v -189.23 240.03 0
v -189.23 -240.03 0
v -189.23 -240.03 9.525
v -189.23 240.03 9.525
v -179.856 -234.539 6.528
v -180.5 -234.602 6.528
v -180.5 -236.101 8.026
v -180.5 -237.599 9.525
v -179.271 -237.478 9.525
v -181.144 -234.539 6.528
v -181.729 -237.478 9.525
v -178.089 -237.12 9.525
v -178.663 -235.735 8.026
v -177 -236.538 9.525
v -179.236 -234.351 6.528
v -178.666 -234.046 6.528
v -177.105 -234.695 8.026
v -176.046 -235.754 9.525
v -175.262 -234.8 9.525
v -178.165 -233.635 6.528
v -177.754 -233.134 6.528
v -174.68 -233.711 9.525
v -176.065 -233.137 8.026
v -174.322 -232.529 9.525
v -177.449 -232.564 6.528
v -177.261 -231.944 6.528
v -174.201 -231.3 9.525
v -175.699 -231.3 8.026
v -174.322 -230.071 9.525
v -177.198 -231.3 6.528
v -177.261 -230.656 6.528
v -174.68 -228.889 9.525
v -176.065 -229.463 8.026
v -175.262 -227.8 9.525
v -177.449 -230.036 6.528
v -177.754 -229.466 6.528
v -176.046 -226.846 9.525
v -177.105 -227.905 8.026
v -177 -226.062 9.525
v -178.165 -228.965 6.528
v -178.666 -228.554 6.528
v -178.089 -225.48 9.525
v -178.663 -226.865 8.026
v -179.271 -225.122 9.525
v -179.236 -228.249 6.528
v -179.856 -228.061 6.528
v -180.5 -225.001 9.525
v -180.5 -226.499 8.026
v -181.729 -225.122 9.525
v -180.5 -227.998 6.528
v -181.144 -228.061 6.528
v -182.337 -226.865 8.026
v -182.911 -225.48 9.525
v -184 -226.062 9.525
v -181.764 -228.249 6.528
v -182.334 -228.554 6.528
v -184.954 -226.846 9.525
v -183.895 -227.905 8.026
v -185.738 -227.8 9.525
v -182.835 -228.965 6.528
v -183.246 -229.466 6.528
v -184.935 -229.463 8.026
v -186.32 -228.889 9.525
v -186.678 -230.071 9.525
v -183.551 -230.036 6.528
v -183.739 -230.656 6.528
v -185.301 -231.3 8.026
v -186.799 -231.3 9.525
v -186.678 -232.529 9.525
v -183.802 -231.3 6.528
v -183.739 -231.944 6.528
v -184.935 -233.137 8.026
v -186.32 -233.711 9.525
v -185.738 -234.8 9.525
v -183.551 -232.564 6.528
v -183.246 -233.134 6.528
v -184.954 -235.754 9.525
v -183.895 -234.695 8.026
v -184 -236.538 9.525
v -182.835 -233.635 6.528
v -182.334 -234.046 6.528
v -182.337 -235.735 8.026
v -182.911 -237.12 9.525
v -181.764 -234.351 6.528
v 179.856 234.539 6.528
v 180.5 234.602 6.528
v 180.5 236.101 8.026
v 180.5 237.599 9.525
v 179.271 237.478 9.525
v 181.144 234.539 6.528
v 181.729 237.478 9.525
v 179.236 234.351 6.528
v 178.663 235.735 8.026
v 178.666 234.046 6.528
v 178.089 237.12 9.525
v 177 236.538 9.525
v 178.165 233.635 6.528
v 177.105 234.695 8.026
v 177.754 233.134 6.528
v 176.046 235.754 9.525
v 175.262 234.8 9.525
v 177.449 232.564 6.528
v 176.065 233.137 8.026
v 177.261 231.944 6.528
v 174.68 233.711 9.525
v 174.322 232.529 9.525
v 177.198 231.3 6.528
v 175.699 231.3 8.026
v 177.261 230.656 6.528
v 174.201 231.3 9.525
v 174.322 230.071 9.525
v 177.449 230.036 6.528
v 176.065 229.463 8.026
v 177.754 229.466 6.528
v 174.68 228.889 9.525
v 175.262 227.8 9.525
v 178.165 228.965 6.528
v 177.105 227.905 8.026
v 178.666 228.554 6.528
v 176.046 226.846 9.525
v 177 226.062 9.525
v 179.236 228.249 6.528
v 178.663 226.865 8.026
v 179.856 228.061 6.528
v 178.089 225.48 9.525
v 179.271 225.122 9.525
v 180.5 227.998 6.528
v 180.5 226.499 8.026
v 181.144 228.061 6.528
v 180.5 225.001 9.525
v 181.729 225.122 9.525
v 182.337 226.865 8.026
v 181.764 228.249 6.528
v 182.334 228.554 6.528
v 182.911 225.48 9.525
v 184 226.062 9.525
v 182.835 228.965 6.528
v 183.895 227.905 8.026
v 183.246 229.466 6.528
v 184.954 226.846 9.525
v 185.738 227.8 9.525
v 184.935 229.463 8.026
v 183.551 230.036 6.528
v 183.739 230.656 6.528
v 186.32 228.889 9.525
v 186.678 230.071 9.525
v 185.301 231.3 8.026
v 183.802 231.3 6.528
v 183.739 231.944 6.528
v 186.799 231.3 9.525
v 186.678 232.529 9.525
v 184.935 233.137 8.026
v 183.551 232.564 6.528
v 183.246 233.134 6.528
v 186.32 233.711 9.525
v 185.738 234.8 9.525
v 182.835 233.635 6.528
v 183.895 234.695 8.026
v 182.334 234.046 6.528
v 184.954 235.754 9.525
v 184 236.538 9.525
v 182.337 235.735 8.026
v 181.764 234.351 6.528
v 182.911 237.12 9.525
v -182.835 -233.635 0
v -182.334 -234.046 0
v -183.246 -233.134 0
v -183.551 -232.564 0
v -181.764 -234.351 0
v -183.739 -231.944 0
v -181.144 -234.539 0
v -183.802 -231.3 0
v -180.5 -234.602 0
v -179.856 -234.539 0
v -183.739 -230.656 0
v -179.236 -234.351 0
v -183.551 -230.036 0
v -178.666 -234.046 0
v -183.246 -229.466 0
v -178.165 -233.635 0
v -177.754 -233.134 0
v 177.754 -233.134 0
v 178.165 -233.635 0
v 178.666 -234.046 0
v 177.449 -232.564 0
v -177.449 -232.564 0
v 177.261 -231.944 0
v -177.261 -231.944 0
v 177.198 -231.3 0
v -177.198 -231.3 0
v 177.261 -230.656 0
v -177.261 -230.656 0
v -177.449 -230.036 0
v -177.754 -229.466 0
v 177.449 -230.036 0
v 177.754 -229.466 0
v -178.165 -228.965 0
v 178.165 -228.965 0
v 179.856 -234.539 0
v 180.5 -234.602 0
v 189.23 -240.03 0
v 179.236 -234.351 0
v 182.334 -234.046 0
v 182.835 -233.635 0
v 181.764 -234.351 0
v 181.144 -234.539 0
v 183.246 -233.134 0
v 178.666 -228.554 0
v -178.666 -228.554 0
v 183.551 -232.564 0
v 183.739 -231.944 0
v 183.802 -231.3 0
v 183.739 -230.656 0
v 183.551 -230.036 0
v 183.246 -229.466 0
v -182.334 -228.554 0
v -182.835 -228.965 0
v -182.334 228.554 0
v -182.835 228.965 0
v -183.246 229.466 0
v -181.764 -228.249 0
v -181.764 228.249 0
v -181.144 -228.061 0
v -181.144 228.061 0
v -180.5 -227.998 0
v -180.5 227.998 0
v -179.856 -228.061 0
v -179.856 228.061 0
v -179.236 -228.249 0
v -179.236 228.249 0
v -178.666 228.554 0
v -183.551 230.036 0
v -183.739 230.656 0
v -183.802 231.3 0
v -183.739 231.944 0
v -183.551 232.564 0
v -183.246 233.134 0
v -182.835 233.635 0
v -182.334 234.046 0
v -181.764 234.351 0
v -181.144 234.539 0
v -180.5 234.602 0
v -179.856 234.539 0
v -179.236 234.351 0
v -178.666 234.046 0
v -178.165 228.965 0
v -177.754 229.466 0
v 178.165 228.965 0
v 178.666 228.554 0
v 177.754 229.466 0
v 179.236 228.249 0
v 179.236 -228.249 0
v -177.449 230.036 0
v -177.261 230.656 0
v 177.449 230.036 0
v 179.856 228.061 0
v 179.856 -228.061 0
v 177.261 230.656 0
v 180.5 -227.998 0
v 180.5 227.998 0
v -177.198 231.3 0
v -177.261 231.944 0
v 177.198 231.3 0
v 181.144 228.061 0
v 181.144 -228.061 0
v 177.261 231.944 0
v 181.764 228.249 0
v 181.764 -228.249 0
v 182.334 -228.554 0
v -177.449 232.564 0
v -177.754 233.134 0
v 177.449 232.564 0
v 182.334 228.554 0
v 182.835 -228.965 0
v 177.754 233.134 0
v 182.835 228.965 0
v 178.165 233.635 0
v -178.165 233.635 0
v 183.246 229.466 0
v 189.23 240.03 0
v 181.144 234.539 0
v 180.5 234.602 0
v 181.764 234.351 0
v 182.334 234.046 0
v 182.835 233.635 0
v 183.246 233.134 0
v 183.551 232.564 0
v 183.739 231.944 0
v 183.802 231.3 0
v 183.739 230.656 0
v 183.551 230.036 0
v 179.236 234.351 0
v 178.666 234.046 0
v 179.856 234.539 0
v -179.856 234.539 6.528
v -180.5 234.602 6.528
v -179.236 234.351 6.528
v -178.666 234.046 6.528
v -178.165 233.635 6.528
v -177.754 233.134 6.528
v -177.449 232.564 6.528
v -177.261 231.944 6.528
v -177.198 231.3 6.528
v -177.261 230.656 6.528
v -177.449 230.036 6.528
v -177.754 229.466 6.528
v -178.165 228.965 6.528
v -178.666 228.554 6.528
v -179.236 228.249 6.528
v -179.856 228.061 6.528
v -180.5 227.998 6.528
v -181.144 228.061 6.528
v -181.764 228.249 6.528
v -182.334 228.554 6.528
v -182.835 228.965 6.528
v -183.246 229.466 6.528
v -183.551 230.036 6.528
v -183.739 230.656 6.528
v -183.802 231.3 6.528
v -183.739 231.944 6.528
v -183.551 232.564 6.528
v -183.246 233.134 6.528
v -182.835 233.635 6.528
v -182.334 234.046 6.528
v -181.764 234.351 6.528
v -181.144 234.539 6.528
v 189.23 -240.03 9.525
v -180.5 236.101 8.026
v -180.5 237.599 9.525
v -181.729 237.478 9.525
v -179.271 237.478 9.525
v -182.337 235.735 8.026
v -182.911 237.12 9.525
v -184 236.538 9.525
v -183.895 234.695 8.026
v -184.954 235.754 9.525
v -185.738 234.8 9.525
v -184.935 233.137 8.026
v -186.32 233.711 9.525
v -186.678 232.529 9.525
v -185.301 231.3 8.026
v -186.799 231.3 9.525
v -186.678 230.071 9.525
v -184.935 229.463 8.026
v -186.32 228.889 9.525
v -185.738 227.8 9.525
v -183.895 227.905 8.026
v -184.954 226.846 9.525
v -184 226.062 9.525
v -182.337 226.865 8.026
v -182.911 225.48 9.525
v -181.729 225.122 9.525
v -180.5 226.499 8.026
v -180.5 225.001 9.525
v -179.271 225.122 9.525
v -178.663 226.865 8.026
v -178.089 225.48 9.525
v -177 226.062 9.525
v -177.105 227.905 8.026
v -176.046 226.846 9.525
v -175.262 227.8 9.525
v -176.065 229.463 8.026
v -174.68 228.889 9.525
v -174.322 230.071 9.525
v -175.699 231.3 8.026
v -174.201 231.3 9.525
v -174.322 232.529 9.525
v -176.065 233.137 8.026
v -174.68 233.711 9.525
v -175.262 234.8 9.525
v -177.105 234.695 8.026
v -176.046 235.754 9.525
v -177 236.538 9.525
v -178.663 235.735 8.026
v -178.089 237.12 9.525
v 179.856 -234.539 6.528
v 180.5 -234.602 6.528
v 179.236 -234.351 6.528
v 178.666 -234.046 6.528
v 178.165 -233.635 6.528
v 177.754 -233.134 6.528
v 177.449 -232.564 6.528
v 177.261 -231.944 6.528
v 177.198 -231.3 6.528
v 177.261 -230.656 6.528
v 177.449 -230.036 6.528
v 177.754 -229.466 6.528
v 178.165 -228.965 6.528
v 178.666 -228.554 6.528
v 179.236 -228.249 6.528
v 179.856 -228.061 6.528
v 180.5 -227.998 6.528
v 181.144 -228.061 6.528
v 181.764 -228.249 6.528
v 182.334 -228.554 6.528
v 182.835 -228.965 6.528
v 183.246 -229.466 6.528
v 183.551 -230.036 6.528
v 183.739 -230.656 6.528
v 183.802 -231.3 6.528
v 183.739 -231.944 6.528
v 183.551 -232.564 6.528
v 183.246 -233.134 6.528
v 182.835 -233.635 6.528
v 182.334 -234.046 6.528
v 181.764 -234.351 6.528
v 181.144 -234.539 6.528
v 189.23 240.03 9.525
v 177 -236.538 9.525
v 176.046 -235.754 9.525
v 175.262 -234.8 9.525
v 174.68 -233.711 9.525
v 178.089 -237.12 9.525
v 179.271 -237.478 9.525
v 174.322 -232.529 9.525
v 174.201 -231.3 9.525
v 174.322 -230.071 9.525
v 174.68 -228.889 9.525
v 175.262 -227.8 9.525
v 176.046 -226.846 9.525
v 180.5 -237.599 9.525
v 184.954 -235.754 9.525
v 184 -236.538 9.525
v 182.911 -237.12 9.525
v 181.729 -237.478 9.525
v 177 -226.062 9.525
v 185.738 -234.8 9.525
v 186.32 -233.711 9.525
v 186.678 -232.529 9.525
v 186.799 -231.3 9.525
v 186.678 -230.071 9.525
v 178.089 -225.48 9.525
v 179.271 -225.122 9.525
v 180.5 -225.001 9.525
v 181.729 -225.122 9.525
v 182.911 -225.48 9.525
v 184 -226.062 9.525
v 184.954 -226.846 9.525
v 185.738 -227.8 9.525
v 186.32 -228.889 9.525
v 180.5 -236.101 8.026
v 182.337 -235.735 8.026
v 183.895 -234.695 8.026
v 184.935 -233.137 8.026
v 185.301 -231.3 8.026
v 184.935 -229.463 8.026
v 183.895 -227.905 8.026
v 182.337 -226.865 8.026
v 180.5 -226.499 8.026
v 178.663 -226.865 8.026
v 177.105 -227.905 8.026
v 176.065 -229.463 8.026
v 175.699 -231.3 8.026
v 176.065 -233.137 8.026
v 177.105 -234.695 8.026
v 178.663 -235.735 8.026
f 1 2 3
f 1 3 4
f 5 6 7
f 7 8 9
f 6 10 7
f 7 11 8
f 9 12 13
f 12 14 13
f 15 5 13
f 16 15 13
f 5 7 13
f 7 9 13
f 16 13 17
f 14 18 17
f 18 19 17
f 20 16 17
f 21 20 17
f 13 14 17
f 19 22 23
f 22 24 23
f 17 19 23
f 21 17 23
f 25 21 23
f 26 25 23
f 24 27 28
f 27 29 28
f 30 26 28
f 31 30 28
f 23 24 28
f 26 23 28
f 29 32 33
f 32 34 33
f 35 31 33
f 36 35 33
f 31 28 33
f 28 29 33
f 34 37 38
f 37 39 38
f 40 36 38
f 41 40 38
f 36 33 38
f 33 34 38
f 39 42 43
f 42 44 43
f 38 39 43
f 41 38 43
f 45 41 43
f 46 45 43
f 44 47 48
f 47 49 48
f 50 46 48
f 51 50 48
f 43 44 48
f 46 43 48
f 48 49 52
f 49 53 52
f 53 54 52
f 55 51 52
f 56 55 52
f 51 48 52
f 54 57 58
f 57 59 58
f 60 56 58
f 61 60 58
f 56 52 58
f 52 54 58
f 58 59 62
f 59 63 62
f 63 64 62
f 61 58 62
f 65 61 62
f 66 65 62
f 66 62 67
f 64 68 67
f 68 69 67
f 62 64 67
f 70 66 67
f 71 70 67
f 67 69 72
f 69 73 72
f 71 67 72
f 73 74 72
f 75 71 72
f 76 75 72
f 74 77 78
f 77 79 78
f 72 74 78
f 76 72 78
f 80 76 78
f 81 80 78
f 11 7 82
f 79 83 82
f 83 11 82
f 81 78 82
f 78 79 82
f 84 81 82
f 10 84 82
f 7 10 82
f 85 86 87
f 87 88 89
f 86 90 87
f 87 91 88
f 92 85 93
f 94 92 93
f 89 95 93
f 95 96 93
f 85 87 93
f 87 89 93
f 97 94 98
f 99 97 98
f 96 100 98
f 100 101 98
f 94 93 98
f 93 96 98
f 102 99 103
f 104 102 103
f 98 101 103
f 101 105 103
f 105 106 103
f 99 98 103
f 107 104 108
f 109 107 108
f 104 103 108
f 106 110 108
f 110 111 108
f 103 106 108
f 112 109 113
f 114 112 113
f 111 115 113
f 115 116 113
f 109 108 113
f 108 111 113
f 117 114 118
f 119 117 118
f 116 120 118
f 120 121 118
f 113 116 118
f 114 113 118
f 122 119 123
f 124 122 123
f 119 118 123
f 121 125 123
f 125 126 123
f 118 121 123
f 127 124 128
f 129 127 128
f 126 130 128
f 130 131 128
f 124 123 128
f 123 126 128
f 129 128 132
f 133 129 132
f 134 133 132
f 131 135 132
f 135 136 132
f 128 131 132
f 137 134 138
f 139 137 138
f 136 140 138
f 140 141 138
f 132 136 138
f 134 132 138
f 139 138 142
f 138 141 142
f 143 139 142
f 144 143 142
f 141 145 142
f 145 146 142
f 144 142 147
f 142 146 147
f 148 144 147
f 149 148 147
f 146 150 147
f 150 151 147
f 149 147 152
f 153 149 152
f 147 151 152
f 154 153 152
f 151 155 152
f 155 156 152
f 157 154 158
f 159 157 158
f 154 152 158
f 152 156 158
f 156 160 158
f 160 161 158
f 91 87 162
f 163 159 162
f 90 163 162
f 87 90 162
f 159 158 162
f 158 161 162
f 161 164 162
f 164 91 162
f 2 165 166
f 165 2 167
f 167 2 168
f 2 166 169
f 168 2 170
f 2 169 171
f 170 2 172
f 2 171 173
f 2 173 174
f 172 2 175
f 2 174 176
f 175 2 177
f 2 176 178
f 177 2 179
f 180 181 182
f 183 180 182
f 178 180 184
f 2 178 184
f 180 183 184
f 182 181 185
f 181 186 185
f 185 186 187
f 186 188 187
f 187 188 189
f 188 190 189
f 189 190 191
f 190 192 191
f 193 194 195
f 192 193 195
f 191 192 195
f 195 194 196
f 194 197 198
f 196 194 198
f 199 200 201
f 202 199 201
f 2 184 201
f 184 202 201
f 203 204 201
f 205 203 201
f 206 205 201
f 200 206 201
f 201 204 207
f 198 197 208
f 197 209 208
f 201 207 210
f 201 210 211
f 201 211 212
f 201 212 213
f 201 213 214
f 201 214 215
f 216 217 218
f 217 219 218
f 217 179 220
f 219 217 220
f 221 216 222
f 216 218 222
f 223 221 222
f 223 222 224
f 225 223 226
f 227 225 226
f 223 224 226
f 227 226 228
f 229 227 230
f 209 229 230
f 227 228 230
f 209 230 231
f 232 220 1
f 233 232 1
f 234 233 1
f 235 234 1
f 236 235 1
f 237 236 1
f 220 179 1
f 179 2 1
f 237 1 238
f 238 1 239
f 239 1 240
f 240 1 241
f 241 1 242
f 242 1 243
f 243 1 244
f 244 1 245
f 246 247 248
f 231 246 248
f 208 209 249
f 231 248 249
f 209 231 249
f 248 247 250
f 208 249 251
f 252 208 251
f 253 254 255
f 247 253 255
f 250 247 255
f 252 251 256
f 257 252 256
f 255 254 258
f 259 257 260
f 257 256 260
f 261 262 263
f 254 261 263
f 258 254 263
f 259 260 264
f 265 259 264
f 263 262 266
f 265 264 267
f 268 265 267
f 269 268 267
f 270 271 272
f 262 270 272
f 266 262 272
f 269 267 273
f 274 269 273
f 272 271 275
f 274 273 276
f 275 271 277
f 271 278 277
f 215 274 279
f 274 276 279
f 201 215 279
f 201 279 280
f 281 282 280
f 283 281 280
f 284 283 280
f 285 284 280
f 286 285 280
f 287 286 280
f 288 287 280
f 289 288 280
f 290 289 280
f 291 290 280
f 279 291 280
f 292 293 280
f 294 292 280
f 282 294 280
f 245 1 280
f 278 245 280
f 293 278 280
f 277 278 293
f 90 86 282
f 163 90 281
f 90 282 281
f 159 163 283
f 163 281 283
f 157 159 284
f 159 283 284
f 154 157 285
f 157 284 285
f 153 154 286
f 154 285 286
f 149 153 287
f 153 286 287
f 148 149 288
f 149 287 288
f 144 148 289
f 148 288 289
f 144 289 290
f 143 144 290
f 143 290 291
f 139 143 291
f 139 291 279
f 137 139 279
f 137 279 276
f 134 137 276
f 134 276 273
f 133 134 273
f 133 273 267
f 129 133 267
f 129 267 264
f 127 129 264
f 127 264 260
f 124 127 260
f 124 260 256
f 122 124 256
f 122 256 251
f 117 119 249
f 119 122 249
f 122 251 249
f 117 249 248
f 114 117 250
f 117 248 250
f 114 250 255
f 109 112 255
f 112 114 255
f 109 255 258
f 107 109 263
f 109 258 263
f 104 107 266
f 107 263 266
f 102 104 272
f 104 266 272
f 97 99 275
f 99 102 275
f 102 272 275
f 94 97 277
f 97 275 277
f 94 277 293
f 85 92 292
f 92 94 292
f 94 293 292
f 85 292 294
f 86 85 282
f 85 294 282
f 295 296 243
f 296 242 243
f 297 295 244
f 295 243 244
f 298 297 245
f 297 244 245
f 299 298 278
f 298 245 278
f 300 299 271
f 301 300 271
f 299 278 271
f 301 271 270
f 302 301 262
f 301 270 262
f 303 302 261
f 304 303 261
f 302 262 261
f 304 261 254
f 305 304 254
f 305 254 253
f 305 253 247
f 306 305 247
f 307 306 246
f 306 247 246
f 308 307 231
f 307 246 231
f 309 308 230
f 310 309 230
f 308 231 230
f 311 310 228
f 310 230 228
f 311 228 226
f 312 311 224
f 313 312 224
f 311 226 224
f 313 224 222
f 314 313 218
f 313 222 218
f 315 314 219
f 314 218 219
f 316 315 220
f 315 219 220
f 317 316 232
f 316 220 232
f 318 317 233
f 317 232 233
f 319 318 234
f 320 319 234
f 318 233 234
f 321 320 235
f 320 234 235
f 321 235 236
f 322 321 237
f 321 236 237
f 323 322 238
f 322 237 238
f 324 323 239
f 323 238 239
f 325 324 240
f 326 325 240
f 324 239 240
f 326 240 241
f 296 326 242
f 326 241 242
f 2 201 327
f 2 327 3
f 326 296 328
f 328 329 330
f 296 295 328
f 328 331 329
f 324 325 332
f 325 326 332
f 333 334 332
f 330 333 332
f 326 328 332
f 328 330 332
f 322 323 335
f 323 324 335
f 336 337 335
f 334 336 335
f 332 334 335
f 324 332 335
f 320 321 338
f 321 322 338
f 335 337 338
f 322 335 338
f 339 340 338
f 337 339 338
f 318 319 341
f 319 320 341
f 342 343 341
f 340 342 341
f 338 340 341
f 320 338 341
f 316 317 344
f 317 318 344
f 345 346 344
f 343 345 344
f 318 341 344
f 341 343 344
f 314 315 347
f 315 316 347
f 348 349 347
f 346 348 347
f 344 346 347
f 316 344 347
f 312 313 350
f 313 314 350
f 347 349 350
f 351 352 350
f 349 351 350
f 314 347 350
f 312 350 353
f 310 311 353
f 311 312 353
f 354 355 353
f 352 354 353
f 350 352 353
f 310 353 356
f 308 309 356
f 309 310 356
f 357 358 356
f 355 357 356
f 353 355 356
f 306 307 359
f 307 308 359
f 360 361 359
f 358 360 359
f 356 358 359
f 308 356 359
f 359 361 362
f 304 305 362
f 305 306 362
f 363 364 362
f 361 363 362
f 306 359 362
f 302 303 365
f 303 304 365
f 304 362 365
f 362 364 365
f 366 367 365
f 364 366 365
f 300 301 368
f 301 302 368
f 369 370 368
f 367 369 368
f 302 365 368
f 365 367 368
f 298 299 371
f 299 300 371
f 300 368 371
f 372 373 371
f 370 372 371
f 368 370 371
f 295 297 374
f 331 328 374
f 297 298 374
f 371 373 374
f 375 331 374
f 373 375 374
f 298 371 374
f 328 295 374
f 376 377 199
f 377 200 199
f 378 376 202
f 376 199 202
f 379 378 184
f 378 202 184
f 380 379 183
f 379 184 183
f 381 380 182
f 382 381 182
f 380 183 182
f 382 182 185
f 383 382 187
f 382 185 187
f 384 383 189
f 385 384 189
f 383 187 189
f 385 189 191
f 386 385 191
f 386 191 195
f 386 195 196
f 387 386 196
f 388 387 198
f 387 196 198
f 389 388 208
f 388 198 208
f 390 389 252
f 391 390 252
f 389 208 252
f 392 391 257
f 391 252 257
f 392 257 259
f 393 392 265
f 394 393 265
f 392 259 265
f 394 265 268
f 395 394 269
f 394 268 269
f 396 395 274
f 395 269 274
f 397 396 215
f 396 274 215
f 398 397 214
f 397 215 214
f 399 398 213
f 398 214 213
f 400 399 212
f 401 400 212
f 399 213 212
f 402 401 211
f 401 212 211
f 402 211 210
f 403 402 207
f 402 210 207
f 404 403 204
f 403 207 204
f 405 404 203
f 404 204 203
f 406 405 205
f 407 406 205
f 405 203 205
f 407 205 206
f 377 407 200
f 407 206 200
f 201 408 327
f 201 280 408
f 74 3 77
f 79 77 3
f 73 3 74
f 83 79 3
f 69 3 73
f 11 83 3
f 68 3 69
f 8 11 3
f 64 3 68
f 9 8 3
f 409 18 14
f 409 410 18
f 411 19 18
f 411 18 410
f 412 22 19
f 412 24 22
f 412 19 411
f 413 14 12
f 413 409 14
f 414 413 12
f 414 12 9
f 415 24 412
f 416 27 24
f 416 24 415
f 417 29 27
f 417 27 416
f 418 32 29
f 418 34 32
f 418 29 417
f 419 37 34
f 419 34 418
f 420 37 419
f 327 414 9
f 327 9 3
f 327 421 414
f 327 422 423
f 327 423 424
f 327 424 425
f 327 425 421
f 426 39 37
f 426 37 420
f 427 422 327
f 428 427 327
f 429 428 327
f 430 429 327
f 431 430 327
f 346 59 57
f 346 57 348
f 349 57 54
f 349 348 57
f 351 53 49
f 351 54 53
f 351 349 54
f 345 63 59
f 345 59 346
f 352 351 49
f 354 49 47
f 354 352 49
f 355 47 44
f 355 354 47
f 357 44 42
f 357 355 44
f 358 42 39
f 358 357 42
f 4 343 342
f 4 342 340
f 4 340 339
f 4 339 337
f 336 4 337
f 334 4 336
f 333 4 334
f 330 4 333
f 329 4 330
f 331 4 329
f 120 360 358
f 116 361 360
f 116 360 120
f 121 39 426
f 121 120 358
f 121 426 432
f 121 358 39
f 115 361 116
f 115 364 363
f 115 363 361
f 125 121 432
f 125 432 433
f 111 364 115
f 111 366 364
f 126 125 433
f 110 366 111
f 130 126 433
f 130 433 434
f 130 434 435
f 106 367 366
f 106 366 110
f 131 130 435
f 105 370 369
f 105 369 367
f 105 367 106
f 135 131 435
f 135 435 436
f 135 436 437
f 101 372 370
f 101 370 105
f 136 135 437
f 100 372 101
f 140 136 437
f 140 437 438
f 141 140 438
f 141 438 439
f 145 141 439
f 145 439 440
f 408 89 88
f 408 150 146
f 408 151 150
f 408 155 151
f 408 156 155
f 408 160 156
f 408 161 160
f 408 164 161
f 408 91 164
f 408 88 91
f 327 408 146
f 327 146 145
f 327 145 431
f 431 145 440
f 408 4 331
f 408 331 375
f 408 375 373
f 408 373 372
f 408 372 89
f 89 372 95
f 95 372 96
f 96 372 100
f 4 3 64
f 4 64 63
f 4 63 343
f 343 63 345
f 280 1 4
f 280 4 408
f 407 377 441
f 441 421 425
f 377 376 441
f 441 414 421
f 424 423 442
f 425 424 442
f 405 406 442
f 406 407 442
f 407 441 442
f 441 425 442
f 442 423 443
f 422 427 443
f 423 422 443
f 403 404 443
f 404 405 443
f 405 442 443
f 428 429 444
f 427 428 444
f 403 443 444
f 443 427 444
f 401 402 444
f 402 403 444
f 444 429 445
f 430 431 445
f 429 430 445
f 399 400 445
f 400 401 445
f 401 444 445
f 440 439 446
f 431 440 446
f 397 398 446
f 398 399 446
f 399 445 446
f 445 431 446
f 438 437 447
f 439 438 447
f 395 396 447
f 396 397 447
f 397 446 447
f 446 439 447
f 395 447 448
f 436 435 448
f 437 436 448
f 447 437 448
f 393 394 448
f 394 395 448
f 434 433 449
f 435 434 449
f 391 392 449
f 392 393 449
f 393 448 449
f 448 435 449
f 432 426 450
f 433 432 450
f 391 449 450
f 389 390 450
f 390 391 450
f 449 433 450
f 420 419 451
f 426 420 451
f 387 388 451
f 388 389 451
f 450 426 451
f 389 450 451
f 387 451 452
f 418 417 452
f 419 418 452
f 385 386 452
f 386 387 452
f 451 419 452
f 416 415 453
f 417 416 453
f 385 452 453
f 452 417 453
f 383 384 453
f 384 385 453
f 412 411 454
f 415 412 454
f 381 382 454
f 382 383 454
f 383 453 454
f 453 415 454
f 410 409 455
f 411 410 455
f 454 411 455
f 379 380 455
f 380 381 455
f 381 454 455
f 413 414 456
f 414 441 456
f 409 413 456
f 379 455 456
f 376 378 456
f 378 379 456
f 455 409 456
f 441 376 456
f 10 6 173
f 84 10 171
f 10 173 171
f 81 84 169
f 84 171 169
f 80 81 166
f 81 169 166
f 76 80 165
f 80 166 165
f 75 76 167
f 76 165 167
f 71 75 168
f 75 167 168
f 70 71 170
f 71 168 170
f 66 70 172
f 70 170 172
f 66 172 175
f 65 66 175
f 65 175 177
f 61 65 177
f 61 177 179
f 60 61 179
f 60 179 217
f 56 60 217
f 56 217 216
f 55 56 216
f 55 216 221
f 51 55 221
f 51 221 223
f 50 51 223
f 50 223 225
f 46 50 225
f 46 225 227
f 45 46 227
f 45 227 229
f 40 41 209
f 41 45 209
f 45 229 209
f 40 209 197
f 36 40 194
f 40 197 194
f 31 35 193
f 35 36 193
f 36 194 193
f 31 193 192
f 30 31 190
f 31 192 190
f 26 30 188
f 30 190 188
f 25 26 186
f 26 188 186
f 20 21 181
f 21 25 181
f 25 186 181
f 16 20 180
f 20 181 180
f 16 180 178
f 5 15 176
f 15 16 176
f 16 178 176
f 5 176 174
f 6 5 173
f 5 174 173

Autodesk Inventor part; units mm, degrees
ref_plane "YZ Plane" through (0, 0, 0) normal (1, 0, 0) x (0, 1, 0)
ref_plane "XZ Plane" through (0, 0, 0) normal (0, 1, 0) x (-1, 0, 0)
ref_plane "XY Plane" through (0, 0, 0) normal (0, 0, 1) x (1, 0, 0)
sketch "Sketch1" plane through (0, 0, 0) normal (0, 0, 1) x (1, 0, 0)
  line L0 (-189.23, 240.03) -> (189.23, 240.03)
  line L1 (189.23, 240.03) -> (189.23, -240.03)
  line L2 (189.23, -240.03) -> (-189.23, -240.03)
  line L3 (-189.23, -240.03) -> (-189.23, 240.03)
  point P0 (0, 0)
  point P1 (-189.23, 0)
  point P2 (0, 240.03)
  dimension "d0" = 378.46
  dimension "d1" = 480.06
extrude "Extrusion1" add sketch "Sketch1" along normal blind 9.525
sketch "Sketch2" plane through (0, 0, 9.525) normal (0, 0, 1) x (1, 0, 0)
  line L0 (189.23, -240.03) -> (-189.23, -240.03) projected
  line L1 (189.23, 240.03) -> (189.23, -240.03) projected
  point P0 (180.5, -231.3)
  dimension "d4" = 8.73
  dimension "d5" = 8.73
hole "Hole1" at (180.5, -231.3, 9.525) direction (0, 0, -1) diameter 6.604 end through all countersink diameter 12.5984 countersink angle 90 clearance for "Flat Head Machine Screw" size "M6" standard "Ansi Metric M Profile"
mirror "Mirror1" about plane through (0, 0, 0) normal (0, 1, 0) of "Hole1"
mirror "Mirror2" about plane through (0, 0, 0) normal (1, 0, 0) of "Hole1", "Mirror1"
properties part number "M178-2005"
